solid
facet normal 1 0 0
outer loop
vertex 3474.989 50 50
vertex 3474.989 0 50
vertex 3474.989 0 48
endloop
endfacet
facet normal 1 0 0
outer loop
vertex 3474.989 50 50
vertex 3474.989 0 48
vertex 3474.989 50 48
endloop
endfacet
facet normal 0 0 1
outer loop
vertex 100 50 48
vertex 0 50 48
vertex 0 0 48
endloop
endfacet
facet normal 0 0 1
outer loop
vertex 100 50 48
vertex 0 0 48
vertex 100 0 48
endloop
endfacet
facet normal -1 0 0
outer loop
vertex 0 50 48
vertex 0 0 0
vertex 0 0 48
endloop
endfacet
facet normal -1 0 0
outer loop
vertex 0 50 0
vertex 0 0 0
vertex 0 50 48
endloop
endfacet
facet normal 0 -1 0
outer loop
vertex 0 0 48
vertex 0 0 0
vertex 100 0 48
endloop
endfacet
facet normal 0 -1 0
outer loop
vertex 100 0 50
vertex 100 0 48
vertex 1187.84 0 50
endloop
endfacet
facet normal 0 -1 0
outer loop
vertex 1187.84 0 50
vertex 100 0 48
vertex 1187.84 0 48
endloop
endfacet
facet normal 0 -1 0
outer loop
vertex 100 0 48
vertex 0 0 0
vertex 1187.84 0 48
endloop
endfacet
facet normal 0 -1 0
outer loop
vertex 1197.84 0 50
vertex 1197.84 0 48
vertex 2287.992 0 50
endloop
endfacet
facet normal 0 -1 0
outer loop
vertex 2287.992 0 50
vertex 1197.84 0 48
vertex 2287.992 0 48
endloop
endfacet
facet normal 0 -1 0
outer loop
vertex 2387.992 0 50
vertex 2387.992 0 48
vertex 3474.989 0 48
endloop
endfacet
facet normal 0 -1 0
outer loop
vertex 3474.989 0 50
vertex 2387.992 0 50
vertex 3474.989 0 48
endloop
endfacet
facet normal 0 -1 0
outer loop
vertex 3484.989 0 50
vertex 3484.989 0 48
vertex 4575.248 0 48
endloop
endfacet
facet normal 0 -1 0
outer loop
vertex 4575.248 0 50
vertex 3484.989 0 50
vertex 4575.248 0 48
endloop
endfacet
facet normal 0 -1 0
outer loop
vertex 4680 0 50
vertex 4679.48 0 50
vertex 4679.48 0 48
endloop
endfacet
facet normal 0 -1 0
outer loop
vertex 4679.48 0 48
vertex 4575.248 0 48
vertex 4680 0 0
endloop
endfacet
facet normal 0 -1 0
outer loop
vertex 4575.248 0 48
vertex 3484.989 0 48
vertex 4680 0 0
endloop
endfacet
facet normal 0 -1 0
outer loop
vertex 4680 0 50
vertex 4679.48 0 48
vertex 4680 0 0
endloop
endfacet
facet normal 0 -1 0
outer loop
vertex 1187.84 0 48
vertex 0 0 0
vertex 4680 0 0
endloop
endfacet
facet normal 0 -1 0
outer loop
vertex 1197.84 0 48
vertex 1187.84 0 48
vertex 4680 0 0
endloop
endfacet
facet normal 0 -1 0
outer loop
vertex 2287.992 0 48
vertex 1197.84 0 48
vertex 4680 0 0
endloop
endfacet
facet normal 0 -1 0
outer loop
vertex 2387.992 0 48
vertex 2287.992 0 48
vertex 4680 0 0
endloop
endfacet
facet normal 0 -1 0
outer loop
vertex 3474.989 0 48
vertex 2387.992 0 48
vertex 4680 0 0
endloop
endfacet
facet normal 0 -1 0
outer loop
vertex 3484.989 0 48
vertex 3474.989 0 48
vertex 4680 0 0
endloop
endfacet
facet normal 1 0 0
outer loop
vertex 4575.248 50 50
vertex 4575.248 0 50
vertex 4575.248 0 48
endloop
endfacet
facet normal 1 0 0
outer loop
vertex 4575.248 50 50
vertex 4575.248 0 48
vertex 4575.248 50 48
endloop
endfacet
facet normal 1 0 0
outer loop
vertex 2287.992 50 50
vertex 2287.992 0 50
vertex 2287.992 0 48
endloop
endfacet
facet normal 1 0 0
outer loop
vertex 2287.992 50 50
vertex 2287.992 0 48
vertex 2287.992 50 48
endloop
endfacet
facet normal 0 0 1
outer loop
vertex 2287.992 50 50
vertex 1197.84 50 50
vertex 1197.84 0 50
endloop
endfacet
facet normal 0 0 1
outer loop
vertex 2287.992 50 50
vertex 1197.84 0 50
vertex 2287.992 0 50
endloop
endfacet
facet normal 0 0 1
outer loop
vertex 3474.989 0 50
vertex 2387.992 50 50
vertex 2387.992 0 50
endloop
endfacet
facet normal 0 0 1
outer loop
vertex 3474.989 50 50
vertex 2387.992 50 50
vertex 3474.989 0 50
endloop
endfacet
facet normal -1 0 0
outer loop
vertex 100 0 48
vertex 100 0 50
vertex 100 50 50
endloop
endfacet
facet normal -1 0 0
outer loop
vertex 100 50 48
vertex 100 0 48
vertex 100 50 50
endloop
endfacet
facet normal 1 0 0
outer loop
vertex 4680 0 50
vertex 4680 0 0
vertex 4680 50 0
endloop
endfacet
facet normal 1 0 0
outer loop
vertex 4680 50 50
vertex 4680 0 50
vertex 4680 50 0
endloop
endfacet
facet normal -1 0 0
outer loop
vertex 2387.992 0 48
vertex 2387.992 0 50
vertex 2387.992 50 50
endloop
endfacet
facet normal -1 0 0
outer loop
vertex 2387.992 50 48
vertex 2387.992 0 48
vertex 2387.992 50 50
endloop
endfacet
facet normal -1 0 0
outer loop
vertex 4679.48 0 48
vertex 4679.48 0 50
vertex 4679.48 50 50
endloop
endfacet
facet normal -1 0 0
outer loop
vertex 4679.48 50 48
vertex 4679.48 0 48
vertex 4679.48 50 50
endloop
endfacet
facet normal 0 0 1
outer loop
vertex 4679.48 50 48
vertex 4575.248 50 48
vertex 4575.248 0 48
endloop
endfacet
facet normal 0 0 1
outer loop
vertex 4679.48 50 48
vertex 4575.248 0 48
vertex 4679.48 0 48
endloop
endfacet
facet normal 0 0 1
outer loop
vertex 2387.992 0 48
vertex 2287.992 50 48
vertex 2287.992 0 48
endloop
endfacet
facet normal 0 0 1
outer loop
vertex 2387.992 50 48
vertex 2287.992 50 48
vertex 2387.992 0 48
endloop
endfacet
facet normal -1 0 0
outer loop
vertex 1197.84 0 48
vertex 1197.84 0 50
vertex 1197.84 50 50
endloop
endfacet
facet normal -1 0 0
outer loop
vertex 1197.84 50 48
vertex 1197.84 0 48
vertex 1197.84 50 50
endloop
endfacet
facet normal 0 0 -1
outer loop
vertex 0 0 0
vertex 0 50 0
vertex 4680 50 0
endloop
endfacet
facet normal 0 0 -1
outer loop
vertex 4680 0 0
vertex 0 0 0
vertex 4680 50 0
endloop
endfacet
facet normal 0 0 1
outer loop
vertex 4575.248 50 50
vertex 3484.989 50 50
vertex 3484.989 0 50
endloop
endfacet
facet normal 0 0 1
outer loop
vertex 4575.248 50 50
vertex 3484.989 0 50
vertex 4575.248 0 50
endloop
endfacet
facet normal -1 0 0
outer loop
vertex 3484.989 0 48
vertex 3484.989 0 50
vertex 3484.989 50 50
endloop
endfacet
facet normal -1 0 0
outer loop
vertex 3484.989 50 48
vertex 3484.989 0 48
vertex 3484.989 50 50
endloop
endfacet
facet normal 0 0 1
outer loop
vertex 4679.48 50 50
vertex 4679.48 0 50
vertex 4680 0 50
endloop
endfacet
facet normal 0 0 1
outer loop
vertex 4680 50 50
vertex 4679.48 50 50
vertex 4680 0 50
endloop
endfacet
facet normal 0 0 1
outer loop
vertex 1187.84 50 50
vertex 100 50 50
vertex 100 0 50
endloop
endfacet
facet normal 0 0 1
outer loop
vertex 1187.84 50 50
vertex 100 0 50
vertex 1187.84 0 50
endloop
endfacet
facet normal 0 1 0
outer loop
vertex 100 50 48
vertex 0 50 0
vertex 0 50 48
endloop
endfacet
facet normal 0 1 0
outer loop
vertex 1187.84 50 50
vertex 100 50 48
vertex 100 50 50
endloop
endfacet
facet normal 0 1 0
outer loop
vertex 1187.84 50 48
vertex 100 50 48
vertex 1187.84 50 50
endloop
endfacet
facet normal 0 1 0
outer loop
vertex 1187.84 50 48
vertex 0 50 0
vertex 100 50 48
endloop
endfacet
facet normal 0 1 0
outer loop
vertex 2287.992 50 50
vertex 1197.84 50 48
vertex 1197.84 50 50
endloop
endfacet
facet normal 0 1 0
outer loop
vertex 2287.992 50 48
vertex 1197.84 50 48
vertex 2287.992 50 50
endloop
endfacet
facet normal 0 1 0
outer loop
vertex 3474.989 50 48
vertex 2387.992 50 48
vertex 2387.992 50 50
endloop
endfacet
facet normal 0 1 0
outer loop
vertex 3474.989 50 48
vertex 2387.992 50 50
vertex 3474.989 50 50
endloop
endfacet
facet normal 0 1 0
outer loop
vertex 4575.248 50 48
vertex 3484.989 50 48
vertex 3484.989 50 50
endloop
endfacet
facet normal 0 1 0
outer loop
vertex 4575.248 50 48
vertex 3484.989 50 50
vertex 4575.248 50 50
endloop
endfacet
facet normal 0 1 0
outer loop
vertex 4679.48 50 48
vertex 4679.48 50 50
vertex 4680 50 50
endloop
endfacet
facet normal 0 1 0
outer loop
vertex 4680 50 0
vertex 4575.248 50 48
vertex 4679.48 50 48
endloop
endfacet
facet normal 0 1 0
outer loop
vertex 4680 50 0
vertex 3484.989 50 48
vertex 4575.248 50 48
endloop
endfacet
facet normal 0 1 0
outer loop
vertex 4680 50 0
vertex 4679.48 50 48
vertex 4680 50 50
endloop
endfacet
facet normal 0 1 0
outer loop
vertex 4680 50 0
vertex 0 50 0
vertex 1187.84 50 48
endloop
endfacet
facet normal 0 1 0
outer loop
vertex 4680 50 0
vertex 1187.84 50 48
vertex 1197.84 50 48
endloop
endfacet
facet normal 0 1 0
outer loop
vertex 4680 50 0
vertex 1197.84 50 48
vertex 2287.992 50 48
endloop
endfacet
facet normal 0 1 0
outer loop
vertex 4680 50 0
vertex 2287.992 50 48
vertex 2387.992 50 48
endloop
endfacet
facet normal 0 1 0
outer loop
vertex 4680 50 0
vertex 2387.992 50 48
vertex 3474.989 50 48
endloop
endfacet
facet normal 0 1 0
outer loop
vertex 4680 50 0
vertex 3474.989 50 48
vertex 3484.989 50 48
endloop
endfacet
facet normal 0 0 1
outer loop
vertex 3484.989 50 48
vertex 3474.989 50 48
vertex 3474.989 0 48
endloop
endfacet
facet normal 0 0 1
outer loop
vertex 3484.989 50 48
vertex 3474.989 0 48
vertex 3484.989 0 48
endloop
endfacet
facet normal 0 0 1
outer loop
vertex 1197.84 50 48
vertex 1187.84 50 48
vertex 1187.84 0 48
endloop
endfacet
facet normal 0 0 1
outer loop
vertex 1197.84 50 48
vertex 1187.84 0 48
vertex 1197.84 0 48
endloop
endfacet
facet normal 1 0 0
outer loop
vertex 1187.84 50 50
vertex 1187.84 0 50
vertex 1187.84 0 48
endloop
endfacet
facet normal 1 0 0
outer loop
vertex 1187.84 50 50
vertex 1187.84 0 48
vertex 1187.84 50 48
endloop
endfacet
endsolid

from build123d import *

# Parameters (mm, degrees)
F0_W      = 4680
F0_H      = 50
F1_DEPTH  = 50
F2_W      = 100
F2_H      = 50
F3_DEPTH  = 2
F5_W      = 10
F5_H      = 55.152472
F6_DEPTH  = 2
F7_W      = 100
F7_H      = 50.594781
F8_DEPTH  = 2
F9_W      = 10
F9_H      = 53.388629
F10_DEPTH = 2
F11_W     = 104.231835
F11_H     = 51.408537
F12_DEPTH = 2


with BuildPart() as f1:
    # F0 (on Top) → F1 (new body)
    with BuildSketch(Plane.XY):
        with Locations((2340, 25)):
            Rectangle(F0_W, F0_H)
    extrude(amount=F1_DEPTH)

    # F2 (on face) → F3 (cut)
    with BuildSketch(Plane.XY.offset(50)):
        with Locations((50, 25)):
            Rectangle(F2_W, F2_H)
    extrude(amount=-F3_DEPTH, mode=Mode.SUBTRACT)

    # F5 (on face) → F6 (cut)
    with BuildSketch(Plane.XY.offset(50)):
        with Locations((1192.839508, 27.576236)):
            Rectangle(F5_W, F5_H)
    extrude(amount=-F6_DEPTH, mode=Mode.SUBTRACT)

    # F7 (on face) → F8 (cut)
    with BuildSketch(Plane.XY.offset(50)):
        with Locations((2337.991524, 25.29739)):
            Rectangle(F7_W, F7_H)
    extrude(amount=-F8_DEPTH, mode=Mode.SUBTRACT)

    # F9 (on face) → F10 (cut)
    with BuildSketch(Plane.XY.offset(50)):
        with Locations((3479.988937, 26.694314)):
            Rectangle(F9_W, F9_H)
    extrude(amount=-F10_DEPTH, mode=Mode.SUBTRACT)

    # F11 (on face) → F12 (cut)
    with BuildSketch(Plane.XY.offset(50)):
        with Locations((4627.364159, 25.704268)):
            Rectangle(F11_W, F11_H)
    extrude(amount=-F12_DEPTH, mode=Mode.SUBTRACT)


solid = f1.part
